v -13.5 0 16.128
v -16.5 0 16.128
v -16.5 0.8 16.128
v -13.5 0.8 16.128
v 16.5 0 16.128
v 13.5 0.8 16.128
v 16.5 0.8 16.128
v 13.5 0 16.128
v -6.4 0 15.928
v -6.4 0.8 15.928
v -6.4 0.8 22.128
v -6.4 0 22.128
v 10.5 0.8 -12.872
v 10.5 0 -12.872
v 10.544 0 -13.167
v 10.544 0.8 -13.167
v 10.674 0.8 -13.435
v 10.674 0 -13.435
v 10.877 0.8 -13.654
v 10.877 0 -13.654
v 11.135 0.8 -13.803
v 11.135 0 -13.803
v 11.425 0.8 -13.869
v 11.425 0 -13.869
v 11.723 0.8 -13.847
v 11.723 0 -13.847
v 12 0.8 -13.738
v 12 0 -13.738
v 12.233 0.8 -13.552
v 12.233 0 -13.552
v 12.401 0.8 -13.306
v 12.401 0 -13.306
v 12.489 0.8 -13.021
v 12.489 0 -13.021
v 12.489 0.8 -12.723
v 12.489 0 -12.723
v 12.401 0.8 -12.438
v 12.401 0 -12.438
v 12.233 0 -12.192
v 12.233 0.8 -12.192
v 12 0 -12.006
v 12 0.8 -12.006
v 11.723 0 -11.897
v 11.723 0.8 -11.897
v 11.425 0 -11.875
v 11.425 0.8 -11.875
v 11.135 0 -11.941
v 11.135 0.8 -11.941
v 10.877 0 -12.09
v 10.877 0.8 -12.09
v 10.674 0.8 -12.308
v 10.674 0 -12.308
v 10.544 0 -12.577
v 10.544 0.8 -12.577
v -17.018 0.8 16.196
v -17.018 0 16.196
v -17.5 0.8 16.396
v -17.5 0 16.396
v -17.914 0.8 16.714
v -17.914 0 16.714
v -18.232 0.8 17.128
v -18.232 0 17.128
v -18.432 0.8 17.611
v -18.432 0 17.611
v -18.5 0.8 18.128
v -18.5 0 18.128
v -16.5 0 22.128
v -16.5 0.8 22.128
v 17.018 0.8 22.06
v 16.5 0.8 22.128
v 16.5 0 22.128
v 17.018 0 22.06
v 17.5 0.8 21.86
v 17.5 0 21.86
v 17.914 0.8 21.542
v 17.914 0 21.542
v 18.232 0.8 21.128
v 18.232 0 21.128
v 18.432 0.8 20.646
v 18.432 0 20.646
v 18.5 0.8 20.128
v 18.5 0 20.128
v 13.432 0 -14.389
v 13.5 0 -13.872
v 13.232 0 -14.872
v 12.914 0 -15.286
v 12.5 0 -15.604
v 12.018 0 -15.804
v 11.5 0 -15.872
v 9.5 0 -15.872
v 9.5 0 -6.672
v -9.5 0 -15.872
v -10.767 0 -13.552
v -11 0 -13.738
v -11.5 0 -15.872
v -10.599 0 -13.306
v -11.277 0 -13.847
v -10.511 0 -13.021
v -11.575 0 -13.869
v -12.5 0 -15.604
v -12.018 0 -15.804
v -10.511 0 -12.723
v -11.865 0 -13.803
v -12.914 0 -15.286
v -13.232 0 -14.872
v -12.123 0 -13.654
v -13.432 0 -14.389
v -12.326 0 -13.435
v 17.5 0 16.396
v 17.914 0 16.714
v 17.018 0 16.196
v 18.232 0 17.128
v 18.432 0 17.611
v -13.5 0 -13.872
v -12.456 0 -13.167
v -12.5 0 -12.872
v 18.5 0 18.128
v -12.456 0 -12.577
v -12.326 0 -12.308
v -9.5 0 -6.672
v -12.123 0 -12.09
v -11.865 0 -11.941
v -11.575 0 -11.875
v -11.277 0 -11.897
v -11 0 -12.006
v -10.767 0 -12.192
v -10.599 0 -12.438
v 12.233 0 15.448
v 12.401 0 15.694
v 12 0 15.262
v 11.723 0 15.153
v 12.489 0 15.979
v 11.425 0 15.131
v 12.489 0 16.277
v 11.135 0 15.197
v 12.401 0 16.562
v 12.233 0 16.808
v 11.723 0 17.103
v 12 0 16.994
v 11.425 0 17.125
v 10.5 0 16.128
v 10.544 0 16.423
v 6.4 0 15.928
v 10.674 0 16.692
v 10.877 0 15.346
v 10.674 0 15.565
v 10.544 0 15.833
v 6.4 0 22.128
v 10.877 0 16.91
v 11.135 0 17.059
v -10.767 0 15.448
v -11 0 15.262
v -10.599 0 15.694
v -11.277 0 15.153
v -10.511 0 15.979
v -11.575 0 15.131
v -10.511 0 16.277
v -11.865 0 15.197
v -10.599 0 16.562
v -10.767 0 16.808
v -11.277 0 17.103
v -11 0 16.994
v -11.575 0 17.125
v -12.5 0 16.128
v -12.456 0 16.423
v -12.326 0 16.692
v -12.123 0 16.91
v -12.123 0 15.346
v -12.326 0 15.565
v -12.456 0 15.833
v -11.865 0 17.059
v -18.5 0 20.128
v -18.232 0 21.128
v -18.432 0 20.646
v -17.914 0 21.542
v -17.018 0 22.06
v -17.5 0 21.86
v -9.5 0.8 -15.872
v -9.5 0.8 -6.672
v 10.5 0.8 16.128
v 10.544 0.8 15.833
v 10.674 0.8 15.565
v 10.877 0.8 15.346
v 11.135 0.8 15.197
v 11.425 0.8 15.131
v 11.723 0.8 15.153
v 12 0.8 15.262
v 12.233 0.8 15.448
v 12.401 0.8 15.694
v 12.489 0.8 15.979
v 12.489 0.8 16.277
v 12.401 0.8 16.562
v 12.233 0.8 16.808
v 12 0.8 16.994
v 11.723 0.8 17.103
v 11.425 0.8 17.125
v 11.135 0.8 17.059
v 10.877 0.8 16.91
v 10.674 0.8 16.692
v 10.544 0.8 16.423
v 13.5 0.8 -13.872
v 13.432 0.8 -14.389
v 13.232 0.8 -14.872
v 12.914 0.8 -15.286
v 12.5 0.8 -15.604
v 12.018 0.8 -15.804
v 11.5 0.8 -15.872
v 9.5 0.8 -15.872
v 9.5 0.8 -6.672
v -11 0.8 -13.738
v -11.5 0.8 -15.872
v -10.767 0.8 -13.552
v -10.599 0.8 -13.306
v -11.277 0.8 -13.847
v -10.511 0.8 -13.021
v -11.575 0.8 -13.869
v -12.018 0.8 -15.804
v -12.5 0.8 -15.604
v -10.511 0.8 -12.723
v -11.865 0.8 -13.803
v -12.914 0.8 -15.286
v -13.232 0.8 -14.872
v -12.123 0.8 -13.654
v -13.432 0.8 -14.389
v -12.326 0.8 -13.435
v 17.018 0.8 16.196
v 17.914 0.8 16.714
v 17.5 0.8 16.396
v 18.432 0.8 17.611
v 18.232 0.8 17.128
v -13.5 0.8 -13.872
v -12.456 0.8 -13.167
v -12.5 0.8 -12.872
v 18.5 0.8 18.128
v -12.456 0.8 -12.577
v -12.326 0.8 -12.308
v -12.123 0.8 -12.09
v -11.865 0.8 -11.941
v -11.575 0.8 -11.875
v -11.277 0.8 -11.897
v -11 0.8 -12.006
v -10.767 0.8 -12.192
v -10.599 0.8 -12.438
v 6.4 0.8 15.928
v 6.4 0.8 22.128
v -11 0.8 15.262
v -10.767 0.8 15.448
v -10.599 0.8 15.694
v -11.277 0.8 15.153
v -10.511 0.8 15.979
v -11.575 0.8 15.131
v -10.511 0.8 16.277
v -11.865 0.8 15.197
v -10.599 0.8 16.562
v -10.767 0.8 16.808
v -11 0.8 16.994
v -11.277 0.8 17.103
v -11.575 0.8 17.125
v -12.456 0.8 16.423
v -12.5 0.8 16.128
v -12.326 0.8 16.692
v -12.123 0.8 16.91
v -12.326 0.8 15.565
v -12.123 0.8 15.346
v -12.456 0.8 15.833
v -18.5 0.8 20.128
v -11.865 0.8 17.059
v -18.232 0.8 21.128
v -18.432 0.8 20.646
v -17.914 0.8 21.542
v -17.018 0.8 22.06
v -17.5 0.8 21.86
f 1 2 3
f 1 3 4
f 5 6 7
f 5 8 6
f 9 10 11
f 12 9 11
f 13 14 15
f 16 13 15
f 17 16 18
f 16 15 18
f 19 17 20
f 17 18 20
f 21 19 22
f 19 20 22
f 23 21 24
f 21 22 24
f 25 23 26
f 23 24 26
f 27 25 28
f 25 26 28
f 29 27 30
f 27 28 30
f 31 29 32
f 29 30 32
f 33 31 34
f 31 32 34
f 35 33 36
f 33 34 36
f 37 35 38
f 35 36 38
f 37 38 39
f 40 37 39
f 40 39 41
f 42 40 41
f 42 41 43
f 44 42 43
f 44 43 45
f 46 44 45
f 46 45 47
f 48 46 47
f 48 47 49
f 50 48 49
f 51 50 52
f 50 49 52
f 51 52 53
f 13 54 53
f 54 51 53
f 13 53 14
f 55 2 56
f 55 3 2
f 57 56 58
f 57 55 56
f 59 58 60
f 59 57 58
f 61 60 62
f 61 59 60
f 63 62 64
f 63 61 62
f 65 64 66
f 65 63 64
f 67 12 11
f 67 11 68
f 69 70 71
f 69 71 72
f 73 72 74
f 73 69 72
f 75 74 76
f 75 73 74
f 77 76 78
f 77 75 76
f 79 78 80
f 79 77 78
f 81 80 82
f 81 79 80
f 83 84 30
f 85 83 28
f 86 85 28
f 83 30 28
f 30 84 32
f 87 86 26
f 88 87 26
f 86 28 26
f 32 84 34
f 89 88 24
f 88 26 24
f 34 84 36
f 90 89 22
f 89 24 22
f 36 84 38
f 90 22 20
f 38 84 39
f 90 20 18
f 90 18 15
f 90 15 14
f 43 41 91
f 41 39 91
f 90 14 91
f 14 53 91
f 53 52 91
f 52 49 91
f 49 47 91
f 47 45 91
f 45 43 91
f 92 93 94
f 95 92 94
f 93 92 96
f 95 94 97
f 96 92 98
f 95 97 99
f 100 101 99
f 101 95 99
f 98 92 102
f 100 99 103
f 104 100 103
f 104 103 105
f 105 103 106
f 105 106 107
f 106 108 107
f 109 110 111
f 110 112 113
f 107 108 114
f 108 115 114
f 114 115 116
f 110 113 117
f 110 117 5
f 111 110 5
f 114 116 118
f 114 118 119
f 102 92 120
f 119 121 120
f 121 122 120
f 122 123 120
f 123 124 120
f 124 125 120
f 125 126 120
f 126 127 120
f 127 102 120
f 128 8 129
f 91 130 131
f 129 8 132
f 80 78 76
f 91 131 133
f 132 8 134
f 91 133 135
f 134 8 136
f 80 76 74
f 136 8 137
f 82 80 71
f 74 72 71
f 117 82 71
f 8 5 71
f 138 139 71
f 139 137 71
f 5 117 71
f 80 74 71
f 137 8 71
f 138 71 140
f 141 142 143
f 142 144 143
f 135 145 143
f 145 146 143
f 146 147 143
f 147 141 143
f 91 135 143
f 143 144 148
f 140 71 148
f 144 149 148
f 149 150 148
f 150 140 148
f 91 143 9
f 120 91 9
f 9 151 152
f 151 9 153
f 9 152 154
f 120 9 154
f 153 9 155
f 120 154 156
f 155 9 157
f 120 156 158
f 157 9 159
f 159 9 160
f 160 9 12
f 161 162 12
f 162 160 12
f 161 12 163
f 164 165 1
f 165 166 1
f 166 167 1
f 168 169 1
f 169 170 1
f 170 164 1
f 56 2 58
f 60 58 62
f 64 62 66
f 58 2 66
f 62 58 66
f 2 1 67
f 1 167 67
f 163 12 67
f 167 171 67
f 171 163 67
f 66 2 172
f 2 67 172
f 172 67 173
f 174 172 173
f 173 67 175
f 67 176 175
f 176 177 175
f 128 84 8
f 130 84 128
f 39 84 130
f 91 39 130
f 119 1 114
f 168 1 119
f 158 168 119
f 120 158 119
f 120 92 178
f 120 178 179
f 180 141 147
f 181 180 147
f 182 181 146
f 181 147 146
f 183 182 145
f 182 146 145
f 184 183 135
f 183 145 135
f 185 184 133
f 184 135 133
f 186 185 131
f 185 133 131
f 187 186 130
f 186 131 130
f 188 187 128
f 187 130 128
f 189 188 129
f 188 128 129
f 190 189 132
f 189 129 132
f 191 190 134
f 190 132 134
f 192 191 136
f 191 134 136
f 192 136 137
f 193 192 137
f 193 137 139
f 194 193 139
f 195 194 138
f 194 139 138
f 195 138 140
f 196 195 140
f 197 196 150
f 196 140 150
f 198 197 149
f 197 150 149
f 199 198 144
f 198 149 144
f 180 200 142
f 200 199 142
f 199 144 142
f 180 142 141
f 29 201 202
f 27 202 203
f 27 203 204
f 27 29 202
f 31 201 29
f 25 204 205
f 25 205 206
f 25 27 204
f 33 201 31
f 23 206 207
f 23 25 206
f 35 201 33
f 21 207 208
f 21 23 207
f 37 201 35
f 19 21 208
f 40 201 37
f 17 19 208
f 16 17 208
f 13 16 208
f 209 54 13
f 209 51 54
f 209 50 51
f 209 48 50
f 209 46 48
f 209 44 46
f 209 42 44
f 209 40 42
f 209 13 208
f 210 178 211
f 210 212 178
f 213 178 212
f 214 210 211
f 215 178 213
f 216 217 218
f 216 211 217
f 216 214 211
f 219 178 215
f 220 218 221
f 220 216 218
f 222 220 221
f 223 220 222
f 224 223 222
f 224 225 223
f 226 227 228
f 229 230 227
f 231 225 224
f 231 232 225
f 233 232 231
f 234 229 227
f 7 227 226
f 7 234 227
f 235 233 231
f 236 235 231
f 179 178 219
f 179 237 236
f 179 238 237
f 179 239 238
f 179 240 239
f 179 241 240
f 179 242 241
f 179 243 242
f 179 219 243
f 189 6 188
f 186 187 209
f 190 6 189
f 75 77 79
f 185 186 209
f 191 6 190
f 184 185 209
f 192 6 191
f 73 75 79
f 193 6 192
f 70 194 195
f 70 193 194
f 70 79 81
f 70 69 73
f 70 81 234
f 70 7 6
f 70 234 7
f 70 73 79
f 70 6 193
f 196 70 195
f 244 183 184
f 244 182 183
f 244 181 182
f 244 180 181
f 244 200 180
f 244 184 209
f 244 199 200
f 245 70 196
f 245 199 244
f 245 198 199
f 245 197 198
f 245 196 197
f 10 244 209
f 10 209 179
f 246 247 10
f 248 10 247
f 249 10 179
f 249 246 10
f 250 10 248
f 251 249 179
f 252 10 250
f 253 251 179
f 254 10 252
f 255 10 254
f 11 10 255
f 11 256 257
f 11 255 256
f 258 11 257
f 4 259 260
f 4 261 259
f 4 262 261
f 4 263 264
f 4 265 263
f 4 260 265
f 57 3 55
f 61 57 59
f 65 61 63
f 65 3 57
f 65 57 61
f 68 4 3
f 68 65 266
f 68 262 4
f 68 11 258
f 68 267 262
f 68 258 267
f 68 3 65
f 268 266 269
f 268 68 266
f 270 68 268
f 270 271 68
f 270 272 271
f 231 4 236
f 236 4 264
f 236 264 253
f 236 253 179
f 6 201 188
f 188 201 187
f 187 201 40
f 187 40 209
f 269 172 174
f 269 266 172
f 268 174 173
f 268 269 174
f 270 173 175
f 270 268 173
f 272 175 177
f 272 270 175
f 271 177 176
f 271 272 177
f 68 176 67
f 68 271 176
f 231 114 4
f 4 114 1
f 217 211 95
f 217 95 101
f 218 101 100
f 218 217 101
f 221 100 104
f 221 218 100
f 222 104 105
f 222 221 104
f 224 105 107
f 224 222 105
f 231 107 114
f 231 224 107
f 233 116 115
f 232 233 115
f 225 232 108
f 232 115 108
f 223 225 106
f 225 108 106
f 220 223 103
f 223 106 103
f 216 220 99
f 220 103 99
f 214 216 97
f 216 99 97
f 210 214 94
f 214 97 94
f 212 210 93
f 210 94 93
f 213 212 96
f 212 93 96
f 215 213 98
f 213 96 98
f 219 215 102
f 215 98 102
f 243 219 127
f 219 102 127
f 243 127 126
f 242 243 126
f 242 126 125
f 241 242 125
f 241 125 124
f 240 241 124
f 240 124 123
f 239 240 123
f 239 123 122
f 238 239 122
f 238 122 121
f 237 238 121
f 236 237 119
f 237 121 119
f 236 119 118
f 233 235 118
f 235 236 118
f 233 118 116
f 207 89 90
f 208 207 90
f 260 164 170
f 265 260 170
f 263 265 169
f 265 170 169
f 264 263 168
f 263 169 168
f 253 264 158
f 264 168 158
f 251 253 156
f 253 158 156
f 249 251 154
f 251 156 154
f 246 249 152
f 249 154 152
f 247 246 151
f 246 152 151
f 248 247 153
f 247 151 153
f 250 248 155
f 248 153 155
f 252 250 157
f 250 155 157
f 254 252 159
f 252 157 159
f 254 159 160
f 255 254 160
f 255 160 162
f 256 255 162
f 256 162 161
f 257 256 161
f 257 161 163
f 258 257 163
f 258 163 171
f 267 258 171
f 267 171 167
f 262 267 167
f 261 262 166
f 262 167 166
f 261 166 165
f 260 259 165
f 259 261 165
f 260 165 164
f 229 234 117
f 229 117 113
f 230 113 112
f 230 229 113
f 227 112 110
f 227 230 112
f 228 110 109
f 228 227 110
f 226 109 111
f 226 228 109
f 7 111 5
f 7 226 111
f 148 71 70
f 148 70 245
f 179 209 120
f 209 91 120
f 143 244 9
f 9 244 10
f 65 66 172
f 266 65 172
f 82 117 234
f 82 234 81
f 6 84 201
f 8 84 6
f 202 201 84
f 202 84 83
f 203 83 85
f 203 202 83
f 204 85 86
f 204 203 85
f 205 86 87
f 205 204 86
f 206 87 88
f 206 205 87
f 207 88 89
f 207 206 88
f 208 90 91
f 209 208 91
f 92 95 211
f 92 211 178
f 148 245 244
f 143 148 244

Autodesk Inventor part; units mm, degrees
ref_plane "YZ Plane" through (0, 0, 0) normal (1, 0, 0) x (0, 1, 0)
ref_plane "XZ Plane" through (0, 0, 0) normal (0, 1, 0) x (-1, 0, 0)
ref_plane "XY Plane" through (0, 0, 0) normal (0, 0, 1) x (1, 0, 0)
sketch "スケッチ1" plane through (0, 0, 0) normal (0, 1, 0) x (-1, 0, 0)
  line L0 (-13.5, -15.8718) -> (-13.5, 16.1282)
  circle A0 centre (-11.5, 16.1282) radius 0.8 projected
  line L1 (-13.5, -10.6768) -> (-13.5, 15.3232) projected
  line L2 (-13.5, 16.1282) -> (-13.5, 10.2382) projected
  line L3 (-13.5, 10.2382) -> (-13.5, -3.9818) projected
  line L4 (-13.5, -3.9818) -> (-13.5, -15.8718) projected
  line L5 (-13.5, -15.8718) -> (-9.5, -15.8718) projected
  line L6 (-9.5, -15.8718) -> (-9.5, -9.8718)
  circle A1 centre (-11.5, 16.1282) radius 0.8 projected
  line L7 (-18.5, 22.1282) -> (0, 22.1282)
  line L8 (-13.5, -15.8718) -> (-9.5, -15.8718)
  line L9 (-9.5, -15.8718) -> (-9.5, -9.8718)
  line L10 (-9.5, -6.6718) -> (0, -6.6718)
  line L11 (-9.5, -15.8718) -> (-9.5, -6.6718)
  line L12 (0, 22.1282) -> (0, -6.6718)
  line L13 (13.5, -15.8718) -> (13.5, 16.1282)
  line L14 (13.5, -15.8718) -> (9.5, -15.8718)
  line L15 (18.5, 22.1282) -> (0, 22.1282)
  line L16 (9.5, -6.6718) -> (0, -6.6718)
  line L17 (9.5, -15.8718) -> (9.5, -6.6718)
  circle A2 centre (-11.5, -12.8718) radius 1
  circle A3 centre (-11.5, 16.1282) radius 1
  circle A4 centre (11.5, -12.8718) radius 1
  circle A5 centre (-11.5, 16.1282) radius 1 projected
  circle A6 centre (11.5, 16.1282) radius 1 projected
  circle A7 centre (-11.5, -12.8718) radius 1 projected
  circle A8 centre (11.5, -12.8718) radius 1 projected
  circle A9 centre (0, -12.6718) radius 7.5 projected
  spline S0 degree 3 poles (0, -30.8718) (-3.9797, -30.6573) (-6.3943, -30.6605) (-10.2198, -30.5013) (-11.7409, -30.3574) (-14.0031, -29.6154) (-14.9542, -29.1518) (-16.6972, -27.6417) (-17.3717, -26.7721) (-18.3737, -25.0018) (-18.7365, -24.1111) (-19.2696, -22.239) (-19.4316, -21.261) (-19.5, -20.2718) knots 0 0 0 0 1.195654 1.195654 2.243866 2.243866 2.930767 2.930767 3.539935 3.539935 4.077393 4.077393 4.633359 4.633359 4.633359 4.633359 projected
  spline S1 degree 3 poles (19.5, -20.2718) (19.3569, -22.3429) (18.8278, -24.0013) (17.6447, -26.3968) (16.8969, -27.447) (15.0392, -29.0976) (14.097, -29.571) (12.111, -30.2513) (10.9109, -30.4205) (7.3866, -30.667) (4.5667, -30.6246) (0, -30.8718) knots 0 0 0 0 0.622814 0.622814 1.176012 1.176012 1.714262 1.714262 2.395692 2.395692 3.535201 3.535201 3.535201 3.535201 projected
  line L18 (19.5, -10.8718) -> (19.5, -20.2718) projected
  arc A10 (19.5, -10.8718) -> (18.5, -9.8718) centre (18.5, -10.8718) ccw projected
  line L19 (13.5, -9.8718) -> (18.5, -9.8718) projected
  line L20 (13.5, 16.1282) -> (13.5, -9.8718) projected
  line L21 (18.5, 16.1282) -> (13.5, 16.1282) projected
  arc A11 (18.5, 16.1282) -> (19.5, 17.1282) centre (18.5, 17.1282) ccw projected
  line L22 (19.5, 21.1282) -> (19.5, 17.1282) projected
  arc A12 (19.5, 21.1282) -> (18.5, 22.1282) centre (18.5, 21.1282) ccw projected
  line L23 (-18.5, 22.1282) -> (18.5, 22.1282) projected
  arc A13 (-18.5, 22.1282) -> (-19.5, 21.1282) centre (-18.5, 21.1282) ccw projected
  line L24 (-19.5, 17.1282) -> (-19.5, 21.1282) projected
  arc A14 (-19.5, 17.1282) -> (-18.5, 16.1282) centre (-18.5, 17.1282) ccw projected
  line L25 (-13.5, 16.1282) -> (-18.5, 16.1282) projected
  line L26 (-13.5, -9.8718) -> (-13.5, 16.1282) projected
  line L27 (-18.5, -9.8718) -> (-13.5, -9.8718) projected
  arc A15 (-18.5, -9.8718) -> (-19.5, -10.8718) centre (-18.5, -10.8718) ccw projected
  line L28 (-19.5, -20.2718) -> (-19.5, -10.8718) projected
  circle A16 centre (-11.5, 16.1282) radius 1 projected
  circle A17 centre (11.5, 16.1282) radius 1 projected
  circle A18 centre (-11.5, -12.8718) radius 1 projected
  circle A19 centre (11.5, -12.8718) radius 1 projected
  circle A20 centre (0, -12.6718) radius 7.5 projected
  spline S2 degree 3 poles (0, -30.8718) (-3.9797, -30.6573) (-6.3943, -30.6605) (-10.2198, -30.5013) (-11.7409, -30.3574) (-14.0031, -29.6154) (-14.9542, -29.1518) (-16.6972, -27.6417) (-17.3717, -26.7721) (-18.3737, -25.0018) (-18.7365, -24.1111) (-19.2696, -22.239) (-19.4316, -21.261) (-19.5, -20.2718) knots 0 0 0 0 1.195654 1.195654 2.243866 2.243866 2.930767 2.930767 3.539935 3.539935 4.077393 4.077393 4.633359 4.633359 4.633359 4.633359 projected
  spline S3 degree 3 poles (19.5, -20.2718) (19.3569, -22.3429) (18.8278, -24.0013) (17.6447, -26.3968) (16.8969, -27.447) (15.0392, -29.0976) (14.097, -29.571) (12.111, -30.2513) (10.9109, -30.4205) (7.3866, -30.667) (4.5667, -30.6246) (0, -30.8718) knots 0 0 0 0 0.622814 0.622814 1.176012 1.176012 1.714262 1.714262 2.395692 2.395692 3.535201 3.535201 3.535201 3.535201 projected
  line L29 (19.5, -10.8718) -> (19.5, -20.2718) projected
  arc A21 (19.5, -10.8718) -> (18.5, -9.8718) centre (18.5, -10.8718) ccw projected
  line L30 (13.5, -9.8718) -> (18.5, -9.8718) projected
  line L31 (13.5, 16.1282) -> (13.5, -9.8718) projected
  line L32 (18.5, 16.1282) -> (13.5, 16.1282) projected
  arc A22 (18.5, 16.1282) -> (19.5, 17.1282) centre (18.5, 17.1282) ccw projected
  line L33 (19.5, 21.1282) -> (19.5, 17.1282) projected
  arc A23 (19.5, 21.1282) -> (18.5, 22.1282) centre (18.5, 21.1282) ccw projected
  line L34 (-18.5, 22.1282) -> (18.5, 22.1282) projected
  arc A24 (-18.5, 22.1282) -> (-19.5, 21.1282) centre (-18.5, 21.1282) ccw projected
  line L35 (-19.5, 17.1282) -> (-19.5, 21.1282) projected
  arc A25 (-19.5, 17.1282) -> (-18.5, 16.1282) centre (-18.5, 17.1282) ccw projected
  line L36 (-13.5, 16.1282) -> (-18.5, 16.1282) projected
  line L37 (-13.5, -9.8718) -> (-13.5, 16.1282) projected
  line L38 (-18.5, -9.8718) -> (-13.5, -9.8718) projected
  arc A26 (-18.5, -9.8718) -> (-19.5, -10.8718) centre (-18.5, -10.8718) ccw projected
  line L39 (-19.5, -20.2718) -> (-19.5, -10.8718) projected
  line L40 (1.5, 6.1282) -> (1.5, 0.1282) projected
  line L41 (-1.5, 6.1282) -> (-1.5, 0.1282) projected
  line L42 (1.5, 3.1282) -> (-1.5, 3.1282)
  line L43 (13.5, 16.1282) -> (18.5, 16.1282)
  line L44 (-13.5, 16.1282) -> (-18.5, 16.1282)
  line L45 (-18.5, 16.1282) -> (-18.5, 22.1282)
  line L46 (18.5, 16.1282) -> (18.5, 22.1282)
  circle A27 centre (11.5, 16.1282) radius 1
  point P0 (0, 0)
  point P1 (11.5, 16.1282)
  point P2 (0, 3.1282)
  point P3 (4.3, 10.2382)
  point P4 (0, -5.1718)
  point P5 (0, -5.1718)
  point P6 (4.5, -6.6718)
  point P7 (-4.5, -6.6718)
  dimension "d56" = 29
  dimension "d57" = 2
  dimension "d60" = 6
extrude "押し出し1" add sketch "スケッチ1" along normal blind 0.8 contours L0 L25 L45 L7 L12 A9 L10 L11 L6 L5 | A9 L12 L10 | L12 A9 L16 | L12 L15 L46 L21 L13 L14 L17 L16 A9
sketch "スケッチ3" plane through (0, 0.8, 0) normal (0, 1, 0) x (1, 0, 0)
  line L0 (6.4, -15.9282) -> (-6.4, -15.9282)
  line L1 (-6.4, -15.9282) -> (-6.4, -22.1282)
  line L2 (6.4, -22.1282) -> (6.4, -15.9282)
  line L3 (-18.5, -22.1282) -> (18.5, -22.1282) projected
  point P0 (0, -15.9282)
  point P1 (0, -22.1282)
  dimension "d26" = 12.8
  dimension "d27" = 6.2
extrude "押し出し3" cut sketch "スケッチ3" against normal through all
fillet "フィレット1" radius 2 6 edges at (13.5, 0.4, -15.8718) (-13.5, 0.4, -15.8718) (-18.5, 0.4, 16.1282) (-18.5, 0.4, 22.1282) (18.5, 0.4, 22.1282) (18.5, 0.4, 16.1282)
properties part number "SubBoard"
